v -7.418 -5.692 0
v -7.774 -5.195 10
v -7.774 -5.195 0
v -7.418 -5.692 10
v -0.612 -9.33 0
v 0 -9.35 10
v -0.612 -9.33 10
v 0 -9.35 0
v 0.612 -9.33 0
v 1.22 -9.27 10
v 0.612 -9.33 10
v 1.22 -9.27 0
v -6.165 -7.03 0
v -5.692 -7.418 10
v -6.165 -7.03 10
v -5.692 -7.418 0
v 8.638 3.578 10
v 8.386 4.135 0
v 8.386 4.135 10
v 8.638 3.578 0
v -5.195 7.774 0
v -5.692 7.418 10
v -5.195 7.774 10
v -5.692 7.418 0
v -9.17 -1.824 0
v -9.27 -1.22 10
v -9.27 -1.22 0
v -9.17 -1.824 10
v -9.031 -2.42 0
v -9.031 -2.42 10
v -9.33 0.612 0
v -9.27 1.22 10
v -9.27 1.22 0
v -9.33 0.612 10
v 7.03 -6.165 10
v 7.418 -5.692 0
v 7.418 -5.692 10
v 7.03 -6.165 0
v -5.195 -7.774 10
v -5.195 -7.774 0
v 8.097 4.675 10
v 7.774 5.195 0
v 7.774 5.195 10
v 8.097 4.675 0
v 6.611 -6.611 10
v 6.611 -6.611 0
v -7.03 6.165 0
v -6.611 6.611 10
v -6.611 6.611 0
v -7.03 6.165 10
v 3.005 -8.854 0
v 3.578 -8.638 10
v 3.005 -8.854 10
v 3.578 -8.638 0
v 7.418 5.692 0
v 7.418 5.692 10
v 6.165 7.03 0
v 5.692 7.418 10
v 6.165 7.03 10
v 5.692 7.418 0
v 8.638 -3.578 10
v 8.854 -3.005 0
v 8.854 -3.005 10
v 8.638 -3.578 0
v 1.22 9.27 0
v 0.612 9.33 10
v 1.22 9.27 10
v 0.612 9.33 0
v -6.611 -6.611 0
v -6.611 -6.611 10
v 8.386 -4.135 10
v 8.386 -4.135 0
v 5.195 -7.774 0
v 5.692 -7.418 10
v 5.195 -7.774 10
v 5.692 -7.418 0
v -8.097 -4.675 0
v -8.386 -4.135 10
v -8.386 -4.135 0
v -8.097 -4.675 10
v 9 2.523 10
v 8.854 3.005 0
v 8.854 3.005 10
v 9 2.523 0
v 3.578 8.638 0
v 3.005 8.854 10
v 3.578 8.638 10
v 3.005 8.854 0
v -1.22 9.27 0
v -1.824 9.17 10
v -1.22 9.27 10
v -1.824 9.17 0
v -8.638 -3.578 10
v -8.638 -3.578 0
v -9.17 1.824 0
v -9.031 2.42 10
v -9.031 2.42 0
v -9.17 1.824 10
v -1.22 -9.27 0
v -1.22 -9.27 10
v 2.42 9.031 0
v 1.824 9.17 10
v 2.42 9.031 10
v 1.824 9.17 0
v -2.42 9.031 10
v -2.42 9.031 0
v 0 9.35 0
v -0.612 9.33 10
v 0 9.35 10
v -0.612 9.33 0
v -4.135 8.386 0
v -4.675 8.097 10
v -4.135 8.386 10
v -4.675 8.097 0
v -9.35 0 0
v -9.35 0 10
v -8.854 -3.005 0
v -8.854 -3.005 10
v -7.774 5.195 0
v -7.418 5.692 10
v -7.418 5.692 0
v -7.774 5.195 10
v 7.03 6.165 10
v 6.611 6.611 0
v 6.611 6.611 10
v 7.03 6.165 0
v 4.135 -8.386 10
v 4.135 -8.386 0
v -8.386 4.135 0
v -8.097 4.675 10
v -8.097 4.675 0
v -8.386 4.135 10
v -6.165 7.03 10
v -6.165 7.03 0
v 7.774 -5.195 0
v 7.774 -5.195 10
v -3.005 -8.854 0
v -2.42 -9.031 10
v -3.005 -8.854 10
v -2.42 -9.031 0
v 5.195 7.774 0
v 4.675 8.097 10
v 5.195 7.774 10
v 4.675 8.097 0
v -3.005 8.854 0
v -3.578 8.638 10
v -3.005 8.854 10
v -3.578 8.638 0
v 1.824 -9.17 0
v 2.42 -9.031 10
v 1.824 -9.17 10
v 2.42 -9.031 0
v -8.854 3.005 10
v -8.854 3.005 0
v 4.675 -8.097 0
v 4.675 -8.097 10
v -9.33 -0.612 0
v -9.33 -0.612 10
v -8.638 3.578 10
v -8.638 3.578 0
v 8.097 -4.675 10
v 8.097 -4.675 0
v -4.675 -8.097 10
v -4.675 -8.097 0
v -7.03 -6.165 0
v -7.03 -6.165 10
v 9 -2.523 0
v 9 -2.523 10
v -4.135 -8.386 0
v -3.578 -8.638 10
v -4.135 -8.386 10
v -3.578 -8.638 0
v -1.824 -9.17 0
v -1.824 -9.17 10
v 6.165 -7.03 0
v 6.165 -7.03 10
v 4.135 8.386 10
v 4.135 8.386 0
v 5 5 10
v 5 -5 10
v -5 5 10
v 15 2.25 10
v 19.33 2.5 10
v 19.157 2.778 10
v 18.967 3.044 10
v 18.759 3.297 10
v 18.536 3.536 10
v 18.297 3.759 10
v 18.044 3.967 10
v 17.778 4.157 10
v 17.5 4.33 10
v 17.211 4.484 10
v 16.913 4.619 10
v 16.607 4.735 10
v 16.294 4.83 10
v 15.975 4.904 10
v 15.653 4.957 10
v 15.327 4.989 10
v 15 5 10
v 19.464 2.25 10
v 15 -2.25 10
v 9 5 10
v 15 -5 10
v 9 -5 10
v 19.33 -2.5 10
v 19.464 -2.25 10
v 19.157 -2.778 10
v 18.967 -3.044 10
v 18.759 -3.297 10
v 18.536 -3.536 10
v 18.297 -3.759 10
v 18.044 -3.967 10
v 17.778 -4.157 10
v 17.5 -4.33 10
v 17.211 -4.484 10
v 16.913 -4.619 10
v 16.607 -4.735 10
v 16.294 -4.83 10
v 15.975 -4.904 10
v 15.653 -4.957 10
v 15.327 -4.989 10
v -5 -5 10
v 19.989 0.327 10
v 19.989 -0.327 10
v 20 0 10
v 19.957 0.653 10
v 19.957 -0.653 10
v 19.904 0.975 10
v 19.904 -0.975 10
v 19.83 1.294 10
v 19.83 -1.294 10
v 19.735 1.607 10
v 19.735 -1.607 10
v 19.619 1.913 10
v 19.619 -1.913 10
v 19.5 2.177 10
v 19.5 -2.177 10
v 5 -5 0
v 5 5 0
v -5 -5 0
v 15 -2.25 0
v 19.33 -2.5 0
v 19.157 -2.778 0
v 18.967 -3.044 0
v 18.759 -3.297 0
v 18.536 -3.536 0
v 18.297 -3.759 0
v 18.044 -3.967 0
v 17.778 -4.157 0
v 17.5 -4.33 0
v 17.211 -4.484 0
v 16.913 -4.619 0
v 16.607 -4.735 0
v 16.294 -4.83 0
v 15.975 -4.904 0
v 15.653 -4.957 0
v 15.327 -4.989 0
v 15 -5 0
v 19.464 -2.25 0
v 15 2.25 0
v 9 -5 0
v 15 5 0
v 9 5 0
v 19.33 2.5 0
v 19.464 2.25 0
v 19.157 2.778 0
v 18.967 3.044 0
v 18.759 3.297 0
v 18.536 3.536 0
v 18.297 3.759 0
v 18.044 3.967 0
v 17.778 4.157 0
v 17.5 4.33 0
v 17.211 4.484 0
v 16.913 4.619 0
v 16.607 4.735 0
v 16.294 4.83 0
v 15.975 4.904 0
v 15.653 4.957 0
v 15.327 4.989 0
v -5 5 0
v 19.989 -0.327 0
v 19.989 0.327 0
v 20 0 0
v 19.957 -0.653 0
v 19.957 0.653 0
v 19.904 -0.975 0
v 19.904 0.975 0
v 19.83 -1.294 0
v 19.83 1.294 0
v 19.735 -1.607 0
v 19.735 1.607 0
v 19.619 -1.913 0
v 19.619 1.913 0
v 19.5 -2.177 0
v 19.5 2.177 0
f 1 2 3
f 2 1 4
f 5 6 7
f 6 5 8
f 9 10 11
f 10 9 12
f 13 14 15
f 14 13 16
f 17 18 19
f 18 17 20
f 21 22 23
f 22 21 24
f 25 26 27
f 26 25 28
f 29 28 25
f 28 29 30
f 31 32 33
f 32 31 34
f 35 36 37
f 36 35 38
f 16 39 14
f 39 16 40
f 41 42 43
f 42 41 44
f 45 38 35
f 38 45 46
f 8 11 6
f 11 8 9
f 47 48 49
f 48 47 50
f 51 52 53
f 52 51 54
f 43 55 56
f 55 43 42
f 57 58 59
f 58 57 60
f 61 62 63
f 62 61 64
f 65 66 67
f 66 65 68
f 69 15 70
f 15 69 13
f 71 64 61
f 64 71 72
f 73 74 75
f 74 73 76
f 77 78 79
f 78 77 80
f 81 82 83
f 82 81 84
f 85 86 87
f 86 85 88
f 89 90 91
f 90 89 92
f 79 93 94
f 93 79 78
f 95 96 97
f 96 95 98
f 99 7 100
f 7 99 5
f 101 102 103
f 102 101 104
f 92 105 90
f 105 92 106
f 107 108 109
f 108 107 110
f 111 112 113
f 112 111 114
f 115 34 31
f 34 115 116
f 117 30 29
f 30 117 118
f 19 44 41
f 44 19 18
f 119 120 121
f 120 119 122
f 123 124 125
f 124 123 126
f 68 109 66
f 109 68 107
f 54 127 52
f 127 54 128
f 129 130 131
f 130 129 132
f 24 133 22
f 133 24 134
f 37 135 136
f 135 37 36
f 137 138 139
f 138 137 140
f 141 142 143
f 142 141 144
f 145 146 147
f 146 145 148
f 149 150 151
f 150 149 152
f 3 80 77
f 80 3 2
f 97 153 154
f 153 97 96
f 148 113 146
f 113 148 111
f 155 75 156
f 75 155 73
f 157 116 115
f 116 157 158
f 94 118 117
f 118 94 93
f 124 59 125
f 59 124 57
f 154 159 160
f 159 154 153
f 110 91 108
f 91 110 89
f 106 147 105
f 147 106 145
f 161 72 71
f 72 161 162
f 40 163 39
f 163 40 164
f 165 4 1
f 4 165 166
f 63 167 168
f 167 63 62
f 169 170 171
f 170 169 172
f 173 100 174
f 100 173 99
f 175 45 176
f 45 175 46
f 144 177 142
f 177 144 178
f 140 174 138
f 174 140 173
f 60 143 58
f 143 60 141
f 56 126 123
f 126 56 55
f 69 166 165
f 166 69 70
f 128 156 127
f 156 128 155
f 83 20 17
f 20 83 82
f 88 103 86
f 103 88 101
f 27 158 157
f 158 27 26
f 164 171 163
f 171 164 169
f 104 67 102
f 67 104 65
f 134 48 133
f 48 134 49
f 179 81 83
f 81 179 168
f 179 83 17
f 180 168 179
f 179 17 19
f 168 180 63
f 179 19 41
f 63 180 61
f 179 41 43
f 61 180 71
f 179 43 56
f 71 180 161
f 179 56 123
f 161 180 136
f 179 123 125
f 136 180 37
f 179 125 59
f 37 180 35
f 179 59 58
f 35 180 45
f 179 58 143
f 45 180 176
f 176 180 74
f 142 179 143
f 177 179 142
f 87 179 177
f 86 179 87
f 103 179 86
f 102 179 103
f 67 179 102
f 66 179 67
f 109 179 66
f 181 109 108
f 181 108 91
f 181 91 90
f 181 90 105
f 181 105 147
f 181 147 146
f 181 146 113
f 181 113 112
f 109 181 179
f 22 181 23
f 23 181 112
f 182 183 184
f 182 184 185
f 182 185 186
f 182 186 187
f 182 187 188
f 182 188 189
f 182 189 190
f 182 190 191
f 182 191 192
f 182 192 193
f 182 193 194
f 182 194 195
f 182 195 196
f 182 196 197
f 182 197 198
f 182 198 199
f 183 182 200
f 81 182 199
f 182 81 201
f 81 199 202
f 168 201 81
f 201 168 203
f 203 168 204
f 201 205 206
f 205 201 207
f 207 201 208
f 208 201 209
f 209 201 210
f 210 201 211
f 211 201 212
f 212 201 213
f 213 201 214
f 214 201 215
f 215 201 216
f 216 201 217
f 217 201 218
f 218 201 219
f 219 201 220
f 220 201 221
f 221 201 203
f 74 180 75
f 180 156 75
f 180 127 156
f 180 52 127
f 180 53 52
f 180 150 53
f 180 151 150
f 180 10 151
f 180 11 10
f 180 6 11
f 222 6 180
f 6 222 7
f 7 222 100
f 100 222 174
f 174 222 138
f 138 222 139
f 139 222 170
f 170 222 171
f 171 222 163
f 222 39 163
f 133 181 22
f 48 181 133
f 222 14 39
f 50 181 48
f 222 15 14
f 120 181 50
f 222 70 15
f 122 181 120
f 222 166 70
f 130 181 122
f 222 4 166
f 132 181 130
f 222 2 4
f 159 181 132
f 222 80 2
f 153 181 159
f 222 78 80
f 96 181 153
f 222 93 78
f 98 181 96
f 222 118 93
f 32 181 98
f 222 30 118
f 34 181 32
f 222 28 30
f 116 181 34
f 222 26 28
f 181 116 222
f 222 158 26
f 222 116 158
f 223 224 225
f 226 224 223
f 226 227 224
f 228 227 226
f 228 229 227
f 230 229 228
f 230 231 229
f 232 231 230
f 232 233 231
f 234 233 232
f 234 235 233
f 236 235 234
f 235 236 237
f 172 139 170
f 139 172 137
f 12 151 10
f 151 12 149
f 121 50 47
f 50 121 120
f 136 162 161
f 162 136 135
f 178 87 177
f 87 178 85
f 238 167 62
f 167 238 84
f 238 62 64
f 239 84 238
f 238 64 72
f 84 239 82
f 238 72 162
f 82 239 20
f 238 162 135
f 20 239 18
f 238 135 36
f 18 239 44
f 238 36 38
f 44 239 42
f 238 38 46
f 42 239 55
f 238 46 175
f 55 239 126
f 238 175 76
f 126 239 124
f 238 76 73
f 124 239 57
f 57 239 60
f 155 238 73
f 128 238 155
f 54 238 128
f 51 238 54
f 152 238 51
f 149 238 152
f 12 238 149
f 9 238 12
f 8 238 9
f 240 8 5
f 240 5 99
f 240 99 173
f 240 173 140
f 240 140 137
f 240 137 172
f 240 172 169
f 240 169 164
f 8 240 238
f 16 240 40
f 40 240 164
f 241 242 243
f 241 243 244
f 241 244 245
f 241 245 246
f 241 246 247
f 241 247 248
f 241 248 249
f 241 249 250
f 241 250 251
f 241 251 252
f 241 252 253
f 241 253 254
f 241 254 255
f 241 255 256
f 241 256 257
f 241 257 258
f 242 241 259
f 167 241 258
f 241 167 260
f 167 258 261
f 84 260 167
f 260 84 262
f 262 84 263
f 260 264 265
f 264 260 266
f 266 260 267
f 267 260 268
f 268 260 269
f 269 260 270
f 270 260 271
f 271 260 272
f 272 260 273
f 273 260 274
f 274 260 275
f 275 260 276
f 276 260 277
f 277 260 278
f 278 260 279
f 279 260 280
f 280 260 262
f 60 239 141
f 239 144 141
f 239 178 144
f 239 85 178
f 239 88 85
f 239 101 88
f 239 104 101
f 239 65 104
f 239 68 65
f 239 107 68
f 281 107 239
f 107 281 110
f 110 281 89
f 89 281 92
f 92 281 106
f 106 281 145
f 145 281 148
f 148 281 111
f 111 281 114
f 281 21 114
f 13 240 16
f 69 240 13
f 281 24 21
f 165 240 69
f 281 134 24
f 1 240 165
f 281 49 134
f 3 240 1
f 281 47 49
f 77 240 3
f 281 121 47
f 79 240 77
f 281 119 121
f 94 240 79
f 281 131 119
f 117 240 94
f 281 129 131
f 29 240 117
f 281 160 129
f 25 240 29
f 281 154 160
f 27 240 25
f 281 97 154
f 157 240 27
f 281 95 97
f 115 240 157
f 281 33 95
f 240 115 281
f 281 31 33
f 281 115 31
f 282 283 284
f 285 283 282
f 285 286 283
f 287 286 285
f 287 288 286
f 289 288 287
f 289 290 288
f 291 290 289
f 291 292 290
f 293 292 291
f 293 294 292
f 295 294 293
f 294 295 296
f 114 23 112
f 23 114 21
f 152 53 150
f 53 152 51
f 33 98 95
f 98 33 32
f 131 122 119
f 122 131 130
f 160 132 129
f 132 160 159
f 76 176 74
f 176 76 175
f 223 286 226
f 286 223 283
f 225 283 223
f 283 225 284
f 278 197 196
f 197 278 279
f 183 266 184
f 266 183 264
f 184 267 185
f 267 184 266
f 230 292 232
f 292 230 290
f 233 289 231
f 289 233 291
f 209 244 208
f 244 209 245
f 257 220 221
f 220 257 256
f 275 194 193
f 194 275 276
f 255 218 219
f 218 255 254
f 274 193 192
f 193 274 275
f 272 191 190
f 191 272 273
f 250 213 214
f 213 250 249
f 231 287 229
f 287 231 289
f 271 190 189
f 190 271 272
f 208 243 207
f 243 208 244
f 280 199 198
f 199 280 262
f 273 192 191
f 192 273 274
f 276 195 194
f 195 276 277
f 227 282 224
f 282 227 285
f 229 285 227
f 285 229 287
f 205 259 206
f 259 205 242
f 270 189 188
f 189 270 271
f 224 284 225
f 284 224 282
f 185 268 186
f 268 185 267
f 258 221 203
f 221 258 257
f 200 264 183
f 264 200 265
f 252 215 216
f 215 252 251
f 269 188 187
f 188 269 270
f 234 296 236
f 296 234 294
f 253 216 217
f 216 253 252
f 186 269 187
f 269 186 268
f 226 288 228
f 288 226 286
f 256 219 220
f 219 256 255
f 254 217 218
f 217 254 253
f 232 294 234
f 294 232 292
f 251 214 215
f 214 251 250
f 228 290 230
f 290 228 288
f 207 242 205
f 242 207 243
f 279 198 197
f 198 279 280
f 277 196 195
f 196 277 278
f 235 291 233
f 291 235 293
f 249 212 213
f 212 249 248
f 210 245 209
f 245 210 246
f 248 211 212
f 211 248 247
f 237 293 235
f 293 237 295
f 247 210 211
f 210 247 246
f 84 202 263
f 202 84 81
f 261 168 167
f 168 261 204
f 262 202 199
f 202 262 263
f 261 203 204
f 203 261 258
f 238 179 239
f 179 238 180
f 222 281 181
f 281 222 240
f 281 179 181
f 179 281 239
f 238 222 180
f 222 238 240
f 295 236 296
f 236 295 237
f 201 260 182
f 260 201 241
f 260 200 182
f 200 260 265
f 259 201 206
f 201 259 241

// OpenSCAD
// Snap-on tubing clip for a 12.7 mm lab stand rod
// Print orientation: flat on bed, extruded up in +Z

// ---- Parameters ----
rod_id      = 12.7;   // stand rod inner diameter
rod_wall    = 3;      // stand rod ring wall thickness
rod_open    = 10;     // width of opening cut from -X side of rod ring
tube_id     = 6;      // tubing inner diameter
tube_wall   = 2;      // tubing ring wall thickness
tube_x      = 15;     // tubing ring centre X
tube_open   = 4.5;    // width of opening cut from +X side of tubing ring
bridge_w    = 6;      // solid bridge width (X), between x = 8 and x = 12
bridge_h    = 10;     // extrusion height (Z)
eps         = 0.5;    // cutter overshoot past faces
$fn         = 96;     // curve resolution

// ---- Model ----
difference() {
    union() {
        // Rod ring
        cylinder(h = bridge_h, d = rod_id + 2 * rod_wall);
        // Tubing ring
        translate([tube_x, 0, 0])
            cylinder(h = bridge_h, d = tube_id + 2 * tube_wall);
        // Solid bridge
        translate([tube_x - bridge_w, -bridge_h / 2, 0])
            cube([bridge_w, bridge_h, bridge_h]);
    }
    // Opening in rod ring (x < 0, -5 < y < 5)
    translate([-rod_open / 2, -5, -eps])
        cube([rod_open, 10, bridge_h + 2 * eps]);
    // Opening in tubing ring (x > 15, -2.25 < y < 2.25)
    translate([tube_x, -tube_open / 2, -eps])
        cube([tube_open, 4.5, bridge_h + 2 * eps]);
}
